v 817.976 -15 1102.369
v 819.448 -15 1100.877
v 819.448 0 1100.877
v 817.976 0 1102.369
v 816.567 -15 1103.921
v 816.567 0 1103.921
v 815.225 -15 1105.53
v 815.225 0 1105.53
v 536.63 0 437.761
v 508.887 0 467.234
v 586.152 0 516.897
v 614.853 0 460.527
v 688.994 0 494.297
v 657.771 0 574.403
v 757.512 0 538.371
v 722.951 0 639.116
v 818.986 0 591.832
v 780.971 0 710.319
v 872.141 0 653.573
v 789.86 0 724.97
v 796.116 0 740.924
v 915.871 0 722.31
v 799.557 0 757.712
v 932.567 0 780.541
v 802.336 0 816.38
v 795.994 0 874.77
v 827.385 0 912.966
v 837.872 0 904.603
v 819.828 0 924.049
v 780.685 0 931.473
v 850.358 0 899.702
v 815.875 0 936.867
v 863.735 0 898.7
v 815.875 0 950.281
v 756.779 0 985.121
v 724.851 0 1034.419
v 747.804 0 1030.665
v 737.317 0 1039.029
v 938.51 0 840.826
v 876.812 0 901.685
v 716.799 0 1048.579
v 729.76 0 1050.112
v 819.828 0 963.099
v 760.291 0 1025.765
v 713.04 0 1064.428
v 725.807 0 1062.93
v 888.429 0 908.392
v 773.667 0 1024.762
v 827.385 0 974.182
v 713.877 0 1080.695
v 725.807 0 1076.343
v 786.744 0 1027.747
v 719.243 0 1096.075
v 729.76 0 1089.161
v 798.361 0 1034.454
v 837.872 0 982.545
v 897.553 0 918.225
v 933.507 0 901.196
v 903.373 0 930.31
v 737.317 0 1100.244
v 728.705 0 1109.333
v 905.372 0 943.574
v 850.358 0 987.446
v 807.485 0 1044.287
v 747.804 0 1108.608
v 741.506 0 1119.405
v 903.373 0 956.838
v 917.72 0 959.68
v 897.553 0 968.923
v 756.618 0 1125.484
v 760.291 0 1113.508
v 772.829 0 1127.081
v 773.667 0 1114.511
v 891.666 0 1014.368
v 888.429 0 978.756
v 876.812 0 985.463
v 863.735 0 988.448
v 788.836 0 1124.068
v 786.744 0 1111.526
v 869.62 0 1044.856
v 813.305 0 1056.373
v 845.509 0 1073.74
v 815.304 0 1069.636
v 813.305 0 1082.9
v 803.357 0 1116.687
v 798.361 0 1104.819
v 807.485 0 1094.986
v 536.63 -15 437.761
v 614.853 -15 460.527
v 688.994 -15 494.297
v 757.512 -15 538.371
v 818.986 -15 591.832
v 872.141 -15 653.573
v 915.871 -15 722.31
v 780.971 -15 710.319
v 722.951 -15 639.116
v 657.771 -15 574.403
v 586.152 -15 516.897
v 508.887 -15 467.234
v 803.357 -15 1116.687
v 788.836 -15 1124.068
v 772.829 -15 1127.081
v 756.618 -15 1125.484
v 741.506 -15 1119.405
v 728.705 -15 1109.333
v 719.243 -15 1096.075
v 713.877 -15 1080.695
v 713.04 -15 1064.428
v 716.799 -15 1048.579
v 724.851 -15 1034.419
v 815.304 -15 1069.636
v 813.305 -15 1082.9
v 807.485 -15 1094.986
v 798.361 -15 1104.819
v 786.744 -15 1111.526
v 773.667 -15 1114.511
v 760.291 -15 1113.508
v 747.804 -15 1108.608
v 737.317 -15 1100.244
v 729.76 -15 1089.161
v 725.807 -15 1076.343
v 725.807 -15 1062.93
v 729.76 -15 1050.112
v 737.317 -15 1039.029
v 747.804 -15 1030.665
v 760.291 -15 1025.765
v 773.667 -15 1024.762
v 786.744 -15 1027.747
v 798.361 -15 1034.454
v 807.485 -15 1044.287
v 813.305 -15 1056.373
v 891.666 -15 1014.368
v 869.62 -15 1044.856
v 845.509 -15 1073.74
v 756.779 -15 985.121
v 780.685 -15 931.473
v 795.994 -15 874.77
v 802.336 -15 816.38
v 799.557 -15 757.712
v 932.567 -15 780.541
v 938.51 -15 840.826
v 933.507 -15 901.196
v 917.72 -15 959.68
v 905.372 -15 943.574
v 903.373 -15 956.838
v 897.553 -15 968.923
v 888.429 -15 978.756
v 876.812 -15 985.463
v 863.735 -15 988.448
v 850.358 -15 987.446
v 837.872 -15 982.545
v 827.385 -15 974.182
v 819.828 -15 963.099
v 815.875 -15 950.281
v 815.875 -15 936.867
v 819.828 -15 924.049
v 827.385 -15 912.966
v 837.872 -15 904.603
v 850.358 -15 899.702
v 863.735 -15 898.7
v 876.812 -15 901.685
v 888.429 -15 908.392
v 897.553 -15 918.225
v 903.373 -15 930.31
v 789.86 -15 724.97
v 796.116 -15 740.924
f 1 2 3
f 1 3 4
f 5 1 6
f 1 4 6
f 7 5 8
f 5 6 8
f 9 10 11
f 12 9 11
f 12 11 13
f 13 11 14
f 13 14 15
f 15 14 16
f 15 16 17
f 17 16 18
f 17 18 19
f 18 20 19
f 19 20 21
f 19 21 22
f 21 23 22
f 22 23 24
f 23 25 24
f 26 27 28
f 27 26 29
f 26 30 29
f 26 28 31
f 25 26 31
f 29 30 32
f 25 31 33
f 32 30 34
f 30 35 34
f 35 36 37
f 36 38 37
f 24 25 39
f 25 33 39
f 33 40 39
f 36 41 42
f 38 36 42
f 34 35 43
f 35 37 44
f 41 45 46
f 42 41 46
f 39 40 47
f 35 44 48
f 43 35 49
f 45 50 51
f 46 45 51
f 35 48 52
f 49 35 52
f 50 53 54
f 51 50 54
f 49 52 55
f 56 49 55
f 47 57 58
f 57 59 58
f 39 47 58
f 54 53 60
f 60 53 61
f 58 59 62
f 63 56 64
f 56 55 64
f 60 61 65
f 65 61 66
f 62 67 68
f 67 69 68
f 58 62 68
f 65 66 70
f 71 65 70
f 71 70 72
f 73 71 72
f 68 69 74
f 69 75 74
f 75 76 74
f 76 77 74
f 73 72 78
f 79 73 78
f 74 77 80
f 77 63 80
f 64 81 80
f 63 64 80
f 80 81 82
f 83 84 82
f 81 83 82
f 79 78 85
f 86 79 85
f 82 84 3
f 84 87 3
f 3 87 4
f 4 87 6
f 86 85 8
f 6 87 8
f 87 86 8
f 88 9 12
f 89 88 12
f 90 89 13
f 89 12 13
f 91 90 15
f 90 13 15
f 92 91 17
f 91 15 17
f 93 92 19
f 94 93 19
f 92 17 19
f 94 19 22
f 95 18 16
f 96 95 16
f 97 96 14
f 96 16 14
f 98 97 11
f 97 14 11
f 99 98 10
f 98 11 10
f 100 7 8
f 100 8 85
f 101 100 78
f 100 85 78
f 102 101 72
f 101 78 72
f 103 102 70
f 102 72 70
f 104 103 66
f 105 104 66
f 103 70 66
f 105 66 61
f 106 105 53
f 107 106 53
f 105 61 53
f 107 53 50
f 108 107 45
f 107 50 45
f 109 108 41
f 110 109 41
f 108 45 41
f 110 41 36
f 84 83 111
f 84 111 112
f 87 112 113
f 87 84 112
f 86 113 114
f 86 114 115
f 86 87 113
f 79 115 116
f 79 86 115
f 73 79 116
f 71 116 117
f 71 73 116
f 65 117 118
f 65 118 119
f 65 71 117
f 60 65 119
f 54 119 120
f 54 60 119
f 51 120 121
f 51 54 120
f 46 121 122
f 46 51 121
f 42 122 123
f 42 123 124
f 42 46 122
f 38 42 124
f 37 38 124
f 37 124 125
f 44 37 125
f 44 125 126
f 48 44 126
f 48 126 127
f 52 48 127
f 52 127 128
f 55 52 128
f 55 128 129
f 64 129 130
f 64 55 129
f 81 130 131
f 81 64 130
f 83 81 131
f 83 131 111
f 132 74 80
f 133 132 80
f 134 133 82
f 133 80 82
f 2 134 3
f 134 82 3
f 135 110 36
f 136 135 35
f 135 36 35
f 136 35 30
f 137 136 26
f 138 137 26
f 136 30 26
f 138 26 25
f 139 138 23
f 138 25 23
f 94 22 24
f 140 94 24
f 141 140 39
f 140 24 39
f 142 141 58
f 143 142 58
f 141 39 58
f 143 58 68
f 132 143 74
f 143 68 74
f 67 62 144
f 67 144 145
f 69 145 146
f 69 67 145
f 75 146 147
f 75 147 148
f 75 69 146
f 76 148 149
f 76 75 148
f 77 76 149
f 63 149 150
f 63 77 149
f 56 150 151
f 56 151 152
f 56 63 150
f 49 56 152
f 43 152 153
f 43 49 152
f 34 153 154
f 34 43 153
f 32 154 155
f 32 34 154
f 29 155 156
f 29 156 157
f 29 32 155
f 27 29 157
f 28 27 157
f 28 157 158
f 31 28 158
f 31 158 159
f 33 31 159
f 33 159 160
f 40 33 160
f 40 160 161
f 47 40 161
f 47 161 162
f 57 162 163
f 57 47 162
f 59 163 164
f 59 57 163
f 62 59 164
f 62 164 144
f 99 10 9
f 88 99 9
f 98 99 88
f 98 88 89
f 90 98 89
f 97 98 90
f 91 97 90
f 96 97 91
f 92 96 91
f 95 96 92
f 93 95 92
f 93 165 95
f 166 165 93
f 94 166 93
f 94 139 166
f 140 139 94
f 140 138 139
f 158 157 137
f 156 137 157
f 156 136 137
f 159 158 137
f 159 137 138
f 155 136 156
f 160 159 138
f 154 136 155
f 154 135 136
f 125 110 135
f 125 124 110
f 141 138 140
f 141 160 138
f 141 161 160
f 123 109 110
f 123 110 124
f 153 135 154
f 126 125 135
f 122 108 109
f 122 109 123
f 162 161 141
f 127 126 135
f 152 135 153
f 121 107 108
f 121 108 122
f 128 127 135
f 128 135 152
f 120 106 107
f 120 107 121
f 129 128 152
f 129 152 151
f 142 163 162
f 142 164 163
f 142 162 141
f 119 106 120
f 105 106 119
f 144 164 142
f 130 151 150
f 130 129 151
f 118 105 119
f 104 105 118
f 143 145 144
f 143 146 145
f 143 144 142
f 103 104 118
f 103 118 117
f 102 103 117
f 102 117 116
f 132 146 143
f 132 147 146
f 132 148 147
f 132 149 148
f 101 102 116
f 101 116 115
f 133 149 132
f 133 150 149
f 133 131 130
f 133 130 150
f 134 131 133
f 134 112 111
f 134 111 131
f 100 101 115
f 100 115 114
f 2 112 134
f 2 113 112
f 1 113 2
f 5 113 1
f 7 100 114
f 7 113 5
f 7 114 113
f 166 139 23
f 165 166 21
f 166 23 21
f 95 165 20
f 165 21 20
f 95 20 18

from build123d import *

# Parameters (mm, degrees)
F0_R     = 45
F1_DEPTH = 15


# Not quite as in the source:
# - ends of sketch curves that miss each other by under 0.0002 mm in the source are joined


with BuildPart() as f1:
    # F0 (on Front) → F1 (new body)
    with BuildSketch(Plane.XZ):
        with BuildLine():
            Line((508.886889, 467.23394), (536.629649, 437.761061))
            ThreePointArc((536.629649, 437.761061), (757.5121515647, 538.3707556644), (915.8713779319, 722.3102730367))
            ThreePointArc((915.8713779319, 722.3102730367), (937.3750069367, 871.1241026292), (891.6662720762, 1014.3675090452))
            ThreePointArc((891.6662720762, 1014.3675090452), (857.8155387776, 1059.5076628094), (819.4482445104, 1100.877414496))
            ThreePointArc((819.4482445104, 1100.877414496), (817.2633574779, 1103.137500552), (815.2248101142, 1105.5304160912))
            ThreePointArc((815.2248101142, 1105.5304160912), (734.7474434458, 1114.8247485045), (724.8508240235, 1034.4192260182))
            ThreePointArc((724.8508240235, 1034.4192260182), (789.4425603105, 903.419496525), (799.5567075135, 757.7118249354))
            ThreePointArc((799.5567075135, 757.7118249354), (793.3301361175, 732.8130625575), (780.9710848276, 710.319232126))
            ThreePointArc((780.9710848276, 710.319232126), (657.7707545167, 574.4028574869), (508.886889, 467.23394))
        make_face()
        with Locations((860.37194, 943.574077)):
            Circle(F0_R, mode=Mode.SUBTRACT)
        with Locations((770.304035, 1069.636489)):
            Circle(F0_R, mode=Mode.SUBTRACT)
    extrude(amount=F1_DEPTH)


solid = f1.part
